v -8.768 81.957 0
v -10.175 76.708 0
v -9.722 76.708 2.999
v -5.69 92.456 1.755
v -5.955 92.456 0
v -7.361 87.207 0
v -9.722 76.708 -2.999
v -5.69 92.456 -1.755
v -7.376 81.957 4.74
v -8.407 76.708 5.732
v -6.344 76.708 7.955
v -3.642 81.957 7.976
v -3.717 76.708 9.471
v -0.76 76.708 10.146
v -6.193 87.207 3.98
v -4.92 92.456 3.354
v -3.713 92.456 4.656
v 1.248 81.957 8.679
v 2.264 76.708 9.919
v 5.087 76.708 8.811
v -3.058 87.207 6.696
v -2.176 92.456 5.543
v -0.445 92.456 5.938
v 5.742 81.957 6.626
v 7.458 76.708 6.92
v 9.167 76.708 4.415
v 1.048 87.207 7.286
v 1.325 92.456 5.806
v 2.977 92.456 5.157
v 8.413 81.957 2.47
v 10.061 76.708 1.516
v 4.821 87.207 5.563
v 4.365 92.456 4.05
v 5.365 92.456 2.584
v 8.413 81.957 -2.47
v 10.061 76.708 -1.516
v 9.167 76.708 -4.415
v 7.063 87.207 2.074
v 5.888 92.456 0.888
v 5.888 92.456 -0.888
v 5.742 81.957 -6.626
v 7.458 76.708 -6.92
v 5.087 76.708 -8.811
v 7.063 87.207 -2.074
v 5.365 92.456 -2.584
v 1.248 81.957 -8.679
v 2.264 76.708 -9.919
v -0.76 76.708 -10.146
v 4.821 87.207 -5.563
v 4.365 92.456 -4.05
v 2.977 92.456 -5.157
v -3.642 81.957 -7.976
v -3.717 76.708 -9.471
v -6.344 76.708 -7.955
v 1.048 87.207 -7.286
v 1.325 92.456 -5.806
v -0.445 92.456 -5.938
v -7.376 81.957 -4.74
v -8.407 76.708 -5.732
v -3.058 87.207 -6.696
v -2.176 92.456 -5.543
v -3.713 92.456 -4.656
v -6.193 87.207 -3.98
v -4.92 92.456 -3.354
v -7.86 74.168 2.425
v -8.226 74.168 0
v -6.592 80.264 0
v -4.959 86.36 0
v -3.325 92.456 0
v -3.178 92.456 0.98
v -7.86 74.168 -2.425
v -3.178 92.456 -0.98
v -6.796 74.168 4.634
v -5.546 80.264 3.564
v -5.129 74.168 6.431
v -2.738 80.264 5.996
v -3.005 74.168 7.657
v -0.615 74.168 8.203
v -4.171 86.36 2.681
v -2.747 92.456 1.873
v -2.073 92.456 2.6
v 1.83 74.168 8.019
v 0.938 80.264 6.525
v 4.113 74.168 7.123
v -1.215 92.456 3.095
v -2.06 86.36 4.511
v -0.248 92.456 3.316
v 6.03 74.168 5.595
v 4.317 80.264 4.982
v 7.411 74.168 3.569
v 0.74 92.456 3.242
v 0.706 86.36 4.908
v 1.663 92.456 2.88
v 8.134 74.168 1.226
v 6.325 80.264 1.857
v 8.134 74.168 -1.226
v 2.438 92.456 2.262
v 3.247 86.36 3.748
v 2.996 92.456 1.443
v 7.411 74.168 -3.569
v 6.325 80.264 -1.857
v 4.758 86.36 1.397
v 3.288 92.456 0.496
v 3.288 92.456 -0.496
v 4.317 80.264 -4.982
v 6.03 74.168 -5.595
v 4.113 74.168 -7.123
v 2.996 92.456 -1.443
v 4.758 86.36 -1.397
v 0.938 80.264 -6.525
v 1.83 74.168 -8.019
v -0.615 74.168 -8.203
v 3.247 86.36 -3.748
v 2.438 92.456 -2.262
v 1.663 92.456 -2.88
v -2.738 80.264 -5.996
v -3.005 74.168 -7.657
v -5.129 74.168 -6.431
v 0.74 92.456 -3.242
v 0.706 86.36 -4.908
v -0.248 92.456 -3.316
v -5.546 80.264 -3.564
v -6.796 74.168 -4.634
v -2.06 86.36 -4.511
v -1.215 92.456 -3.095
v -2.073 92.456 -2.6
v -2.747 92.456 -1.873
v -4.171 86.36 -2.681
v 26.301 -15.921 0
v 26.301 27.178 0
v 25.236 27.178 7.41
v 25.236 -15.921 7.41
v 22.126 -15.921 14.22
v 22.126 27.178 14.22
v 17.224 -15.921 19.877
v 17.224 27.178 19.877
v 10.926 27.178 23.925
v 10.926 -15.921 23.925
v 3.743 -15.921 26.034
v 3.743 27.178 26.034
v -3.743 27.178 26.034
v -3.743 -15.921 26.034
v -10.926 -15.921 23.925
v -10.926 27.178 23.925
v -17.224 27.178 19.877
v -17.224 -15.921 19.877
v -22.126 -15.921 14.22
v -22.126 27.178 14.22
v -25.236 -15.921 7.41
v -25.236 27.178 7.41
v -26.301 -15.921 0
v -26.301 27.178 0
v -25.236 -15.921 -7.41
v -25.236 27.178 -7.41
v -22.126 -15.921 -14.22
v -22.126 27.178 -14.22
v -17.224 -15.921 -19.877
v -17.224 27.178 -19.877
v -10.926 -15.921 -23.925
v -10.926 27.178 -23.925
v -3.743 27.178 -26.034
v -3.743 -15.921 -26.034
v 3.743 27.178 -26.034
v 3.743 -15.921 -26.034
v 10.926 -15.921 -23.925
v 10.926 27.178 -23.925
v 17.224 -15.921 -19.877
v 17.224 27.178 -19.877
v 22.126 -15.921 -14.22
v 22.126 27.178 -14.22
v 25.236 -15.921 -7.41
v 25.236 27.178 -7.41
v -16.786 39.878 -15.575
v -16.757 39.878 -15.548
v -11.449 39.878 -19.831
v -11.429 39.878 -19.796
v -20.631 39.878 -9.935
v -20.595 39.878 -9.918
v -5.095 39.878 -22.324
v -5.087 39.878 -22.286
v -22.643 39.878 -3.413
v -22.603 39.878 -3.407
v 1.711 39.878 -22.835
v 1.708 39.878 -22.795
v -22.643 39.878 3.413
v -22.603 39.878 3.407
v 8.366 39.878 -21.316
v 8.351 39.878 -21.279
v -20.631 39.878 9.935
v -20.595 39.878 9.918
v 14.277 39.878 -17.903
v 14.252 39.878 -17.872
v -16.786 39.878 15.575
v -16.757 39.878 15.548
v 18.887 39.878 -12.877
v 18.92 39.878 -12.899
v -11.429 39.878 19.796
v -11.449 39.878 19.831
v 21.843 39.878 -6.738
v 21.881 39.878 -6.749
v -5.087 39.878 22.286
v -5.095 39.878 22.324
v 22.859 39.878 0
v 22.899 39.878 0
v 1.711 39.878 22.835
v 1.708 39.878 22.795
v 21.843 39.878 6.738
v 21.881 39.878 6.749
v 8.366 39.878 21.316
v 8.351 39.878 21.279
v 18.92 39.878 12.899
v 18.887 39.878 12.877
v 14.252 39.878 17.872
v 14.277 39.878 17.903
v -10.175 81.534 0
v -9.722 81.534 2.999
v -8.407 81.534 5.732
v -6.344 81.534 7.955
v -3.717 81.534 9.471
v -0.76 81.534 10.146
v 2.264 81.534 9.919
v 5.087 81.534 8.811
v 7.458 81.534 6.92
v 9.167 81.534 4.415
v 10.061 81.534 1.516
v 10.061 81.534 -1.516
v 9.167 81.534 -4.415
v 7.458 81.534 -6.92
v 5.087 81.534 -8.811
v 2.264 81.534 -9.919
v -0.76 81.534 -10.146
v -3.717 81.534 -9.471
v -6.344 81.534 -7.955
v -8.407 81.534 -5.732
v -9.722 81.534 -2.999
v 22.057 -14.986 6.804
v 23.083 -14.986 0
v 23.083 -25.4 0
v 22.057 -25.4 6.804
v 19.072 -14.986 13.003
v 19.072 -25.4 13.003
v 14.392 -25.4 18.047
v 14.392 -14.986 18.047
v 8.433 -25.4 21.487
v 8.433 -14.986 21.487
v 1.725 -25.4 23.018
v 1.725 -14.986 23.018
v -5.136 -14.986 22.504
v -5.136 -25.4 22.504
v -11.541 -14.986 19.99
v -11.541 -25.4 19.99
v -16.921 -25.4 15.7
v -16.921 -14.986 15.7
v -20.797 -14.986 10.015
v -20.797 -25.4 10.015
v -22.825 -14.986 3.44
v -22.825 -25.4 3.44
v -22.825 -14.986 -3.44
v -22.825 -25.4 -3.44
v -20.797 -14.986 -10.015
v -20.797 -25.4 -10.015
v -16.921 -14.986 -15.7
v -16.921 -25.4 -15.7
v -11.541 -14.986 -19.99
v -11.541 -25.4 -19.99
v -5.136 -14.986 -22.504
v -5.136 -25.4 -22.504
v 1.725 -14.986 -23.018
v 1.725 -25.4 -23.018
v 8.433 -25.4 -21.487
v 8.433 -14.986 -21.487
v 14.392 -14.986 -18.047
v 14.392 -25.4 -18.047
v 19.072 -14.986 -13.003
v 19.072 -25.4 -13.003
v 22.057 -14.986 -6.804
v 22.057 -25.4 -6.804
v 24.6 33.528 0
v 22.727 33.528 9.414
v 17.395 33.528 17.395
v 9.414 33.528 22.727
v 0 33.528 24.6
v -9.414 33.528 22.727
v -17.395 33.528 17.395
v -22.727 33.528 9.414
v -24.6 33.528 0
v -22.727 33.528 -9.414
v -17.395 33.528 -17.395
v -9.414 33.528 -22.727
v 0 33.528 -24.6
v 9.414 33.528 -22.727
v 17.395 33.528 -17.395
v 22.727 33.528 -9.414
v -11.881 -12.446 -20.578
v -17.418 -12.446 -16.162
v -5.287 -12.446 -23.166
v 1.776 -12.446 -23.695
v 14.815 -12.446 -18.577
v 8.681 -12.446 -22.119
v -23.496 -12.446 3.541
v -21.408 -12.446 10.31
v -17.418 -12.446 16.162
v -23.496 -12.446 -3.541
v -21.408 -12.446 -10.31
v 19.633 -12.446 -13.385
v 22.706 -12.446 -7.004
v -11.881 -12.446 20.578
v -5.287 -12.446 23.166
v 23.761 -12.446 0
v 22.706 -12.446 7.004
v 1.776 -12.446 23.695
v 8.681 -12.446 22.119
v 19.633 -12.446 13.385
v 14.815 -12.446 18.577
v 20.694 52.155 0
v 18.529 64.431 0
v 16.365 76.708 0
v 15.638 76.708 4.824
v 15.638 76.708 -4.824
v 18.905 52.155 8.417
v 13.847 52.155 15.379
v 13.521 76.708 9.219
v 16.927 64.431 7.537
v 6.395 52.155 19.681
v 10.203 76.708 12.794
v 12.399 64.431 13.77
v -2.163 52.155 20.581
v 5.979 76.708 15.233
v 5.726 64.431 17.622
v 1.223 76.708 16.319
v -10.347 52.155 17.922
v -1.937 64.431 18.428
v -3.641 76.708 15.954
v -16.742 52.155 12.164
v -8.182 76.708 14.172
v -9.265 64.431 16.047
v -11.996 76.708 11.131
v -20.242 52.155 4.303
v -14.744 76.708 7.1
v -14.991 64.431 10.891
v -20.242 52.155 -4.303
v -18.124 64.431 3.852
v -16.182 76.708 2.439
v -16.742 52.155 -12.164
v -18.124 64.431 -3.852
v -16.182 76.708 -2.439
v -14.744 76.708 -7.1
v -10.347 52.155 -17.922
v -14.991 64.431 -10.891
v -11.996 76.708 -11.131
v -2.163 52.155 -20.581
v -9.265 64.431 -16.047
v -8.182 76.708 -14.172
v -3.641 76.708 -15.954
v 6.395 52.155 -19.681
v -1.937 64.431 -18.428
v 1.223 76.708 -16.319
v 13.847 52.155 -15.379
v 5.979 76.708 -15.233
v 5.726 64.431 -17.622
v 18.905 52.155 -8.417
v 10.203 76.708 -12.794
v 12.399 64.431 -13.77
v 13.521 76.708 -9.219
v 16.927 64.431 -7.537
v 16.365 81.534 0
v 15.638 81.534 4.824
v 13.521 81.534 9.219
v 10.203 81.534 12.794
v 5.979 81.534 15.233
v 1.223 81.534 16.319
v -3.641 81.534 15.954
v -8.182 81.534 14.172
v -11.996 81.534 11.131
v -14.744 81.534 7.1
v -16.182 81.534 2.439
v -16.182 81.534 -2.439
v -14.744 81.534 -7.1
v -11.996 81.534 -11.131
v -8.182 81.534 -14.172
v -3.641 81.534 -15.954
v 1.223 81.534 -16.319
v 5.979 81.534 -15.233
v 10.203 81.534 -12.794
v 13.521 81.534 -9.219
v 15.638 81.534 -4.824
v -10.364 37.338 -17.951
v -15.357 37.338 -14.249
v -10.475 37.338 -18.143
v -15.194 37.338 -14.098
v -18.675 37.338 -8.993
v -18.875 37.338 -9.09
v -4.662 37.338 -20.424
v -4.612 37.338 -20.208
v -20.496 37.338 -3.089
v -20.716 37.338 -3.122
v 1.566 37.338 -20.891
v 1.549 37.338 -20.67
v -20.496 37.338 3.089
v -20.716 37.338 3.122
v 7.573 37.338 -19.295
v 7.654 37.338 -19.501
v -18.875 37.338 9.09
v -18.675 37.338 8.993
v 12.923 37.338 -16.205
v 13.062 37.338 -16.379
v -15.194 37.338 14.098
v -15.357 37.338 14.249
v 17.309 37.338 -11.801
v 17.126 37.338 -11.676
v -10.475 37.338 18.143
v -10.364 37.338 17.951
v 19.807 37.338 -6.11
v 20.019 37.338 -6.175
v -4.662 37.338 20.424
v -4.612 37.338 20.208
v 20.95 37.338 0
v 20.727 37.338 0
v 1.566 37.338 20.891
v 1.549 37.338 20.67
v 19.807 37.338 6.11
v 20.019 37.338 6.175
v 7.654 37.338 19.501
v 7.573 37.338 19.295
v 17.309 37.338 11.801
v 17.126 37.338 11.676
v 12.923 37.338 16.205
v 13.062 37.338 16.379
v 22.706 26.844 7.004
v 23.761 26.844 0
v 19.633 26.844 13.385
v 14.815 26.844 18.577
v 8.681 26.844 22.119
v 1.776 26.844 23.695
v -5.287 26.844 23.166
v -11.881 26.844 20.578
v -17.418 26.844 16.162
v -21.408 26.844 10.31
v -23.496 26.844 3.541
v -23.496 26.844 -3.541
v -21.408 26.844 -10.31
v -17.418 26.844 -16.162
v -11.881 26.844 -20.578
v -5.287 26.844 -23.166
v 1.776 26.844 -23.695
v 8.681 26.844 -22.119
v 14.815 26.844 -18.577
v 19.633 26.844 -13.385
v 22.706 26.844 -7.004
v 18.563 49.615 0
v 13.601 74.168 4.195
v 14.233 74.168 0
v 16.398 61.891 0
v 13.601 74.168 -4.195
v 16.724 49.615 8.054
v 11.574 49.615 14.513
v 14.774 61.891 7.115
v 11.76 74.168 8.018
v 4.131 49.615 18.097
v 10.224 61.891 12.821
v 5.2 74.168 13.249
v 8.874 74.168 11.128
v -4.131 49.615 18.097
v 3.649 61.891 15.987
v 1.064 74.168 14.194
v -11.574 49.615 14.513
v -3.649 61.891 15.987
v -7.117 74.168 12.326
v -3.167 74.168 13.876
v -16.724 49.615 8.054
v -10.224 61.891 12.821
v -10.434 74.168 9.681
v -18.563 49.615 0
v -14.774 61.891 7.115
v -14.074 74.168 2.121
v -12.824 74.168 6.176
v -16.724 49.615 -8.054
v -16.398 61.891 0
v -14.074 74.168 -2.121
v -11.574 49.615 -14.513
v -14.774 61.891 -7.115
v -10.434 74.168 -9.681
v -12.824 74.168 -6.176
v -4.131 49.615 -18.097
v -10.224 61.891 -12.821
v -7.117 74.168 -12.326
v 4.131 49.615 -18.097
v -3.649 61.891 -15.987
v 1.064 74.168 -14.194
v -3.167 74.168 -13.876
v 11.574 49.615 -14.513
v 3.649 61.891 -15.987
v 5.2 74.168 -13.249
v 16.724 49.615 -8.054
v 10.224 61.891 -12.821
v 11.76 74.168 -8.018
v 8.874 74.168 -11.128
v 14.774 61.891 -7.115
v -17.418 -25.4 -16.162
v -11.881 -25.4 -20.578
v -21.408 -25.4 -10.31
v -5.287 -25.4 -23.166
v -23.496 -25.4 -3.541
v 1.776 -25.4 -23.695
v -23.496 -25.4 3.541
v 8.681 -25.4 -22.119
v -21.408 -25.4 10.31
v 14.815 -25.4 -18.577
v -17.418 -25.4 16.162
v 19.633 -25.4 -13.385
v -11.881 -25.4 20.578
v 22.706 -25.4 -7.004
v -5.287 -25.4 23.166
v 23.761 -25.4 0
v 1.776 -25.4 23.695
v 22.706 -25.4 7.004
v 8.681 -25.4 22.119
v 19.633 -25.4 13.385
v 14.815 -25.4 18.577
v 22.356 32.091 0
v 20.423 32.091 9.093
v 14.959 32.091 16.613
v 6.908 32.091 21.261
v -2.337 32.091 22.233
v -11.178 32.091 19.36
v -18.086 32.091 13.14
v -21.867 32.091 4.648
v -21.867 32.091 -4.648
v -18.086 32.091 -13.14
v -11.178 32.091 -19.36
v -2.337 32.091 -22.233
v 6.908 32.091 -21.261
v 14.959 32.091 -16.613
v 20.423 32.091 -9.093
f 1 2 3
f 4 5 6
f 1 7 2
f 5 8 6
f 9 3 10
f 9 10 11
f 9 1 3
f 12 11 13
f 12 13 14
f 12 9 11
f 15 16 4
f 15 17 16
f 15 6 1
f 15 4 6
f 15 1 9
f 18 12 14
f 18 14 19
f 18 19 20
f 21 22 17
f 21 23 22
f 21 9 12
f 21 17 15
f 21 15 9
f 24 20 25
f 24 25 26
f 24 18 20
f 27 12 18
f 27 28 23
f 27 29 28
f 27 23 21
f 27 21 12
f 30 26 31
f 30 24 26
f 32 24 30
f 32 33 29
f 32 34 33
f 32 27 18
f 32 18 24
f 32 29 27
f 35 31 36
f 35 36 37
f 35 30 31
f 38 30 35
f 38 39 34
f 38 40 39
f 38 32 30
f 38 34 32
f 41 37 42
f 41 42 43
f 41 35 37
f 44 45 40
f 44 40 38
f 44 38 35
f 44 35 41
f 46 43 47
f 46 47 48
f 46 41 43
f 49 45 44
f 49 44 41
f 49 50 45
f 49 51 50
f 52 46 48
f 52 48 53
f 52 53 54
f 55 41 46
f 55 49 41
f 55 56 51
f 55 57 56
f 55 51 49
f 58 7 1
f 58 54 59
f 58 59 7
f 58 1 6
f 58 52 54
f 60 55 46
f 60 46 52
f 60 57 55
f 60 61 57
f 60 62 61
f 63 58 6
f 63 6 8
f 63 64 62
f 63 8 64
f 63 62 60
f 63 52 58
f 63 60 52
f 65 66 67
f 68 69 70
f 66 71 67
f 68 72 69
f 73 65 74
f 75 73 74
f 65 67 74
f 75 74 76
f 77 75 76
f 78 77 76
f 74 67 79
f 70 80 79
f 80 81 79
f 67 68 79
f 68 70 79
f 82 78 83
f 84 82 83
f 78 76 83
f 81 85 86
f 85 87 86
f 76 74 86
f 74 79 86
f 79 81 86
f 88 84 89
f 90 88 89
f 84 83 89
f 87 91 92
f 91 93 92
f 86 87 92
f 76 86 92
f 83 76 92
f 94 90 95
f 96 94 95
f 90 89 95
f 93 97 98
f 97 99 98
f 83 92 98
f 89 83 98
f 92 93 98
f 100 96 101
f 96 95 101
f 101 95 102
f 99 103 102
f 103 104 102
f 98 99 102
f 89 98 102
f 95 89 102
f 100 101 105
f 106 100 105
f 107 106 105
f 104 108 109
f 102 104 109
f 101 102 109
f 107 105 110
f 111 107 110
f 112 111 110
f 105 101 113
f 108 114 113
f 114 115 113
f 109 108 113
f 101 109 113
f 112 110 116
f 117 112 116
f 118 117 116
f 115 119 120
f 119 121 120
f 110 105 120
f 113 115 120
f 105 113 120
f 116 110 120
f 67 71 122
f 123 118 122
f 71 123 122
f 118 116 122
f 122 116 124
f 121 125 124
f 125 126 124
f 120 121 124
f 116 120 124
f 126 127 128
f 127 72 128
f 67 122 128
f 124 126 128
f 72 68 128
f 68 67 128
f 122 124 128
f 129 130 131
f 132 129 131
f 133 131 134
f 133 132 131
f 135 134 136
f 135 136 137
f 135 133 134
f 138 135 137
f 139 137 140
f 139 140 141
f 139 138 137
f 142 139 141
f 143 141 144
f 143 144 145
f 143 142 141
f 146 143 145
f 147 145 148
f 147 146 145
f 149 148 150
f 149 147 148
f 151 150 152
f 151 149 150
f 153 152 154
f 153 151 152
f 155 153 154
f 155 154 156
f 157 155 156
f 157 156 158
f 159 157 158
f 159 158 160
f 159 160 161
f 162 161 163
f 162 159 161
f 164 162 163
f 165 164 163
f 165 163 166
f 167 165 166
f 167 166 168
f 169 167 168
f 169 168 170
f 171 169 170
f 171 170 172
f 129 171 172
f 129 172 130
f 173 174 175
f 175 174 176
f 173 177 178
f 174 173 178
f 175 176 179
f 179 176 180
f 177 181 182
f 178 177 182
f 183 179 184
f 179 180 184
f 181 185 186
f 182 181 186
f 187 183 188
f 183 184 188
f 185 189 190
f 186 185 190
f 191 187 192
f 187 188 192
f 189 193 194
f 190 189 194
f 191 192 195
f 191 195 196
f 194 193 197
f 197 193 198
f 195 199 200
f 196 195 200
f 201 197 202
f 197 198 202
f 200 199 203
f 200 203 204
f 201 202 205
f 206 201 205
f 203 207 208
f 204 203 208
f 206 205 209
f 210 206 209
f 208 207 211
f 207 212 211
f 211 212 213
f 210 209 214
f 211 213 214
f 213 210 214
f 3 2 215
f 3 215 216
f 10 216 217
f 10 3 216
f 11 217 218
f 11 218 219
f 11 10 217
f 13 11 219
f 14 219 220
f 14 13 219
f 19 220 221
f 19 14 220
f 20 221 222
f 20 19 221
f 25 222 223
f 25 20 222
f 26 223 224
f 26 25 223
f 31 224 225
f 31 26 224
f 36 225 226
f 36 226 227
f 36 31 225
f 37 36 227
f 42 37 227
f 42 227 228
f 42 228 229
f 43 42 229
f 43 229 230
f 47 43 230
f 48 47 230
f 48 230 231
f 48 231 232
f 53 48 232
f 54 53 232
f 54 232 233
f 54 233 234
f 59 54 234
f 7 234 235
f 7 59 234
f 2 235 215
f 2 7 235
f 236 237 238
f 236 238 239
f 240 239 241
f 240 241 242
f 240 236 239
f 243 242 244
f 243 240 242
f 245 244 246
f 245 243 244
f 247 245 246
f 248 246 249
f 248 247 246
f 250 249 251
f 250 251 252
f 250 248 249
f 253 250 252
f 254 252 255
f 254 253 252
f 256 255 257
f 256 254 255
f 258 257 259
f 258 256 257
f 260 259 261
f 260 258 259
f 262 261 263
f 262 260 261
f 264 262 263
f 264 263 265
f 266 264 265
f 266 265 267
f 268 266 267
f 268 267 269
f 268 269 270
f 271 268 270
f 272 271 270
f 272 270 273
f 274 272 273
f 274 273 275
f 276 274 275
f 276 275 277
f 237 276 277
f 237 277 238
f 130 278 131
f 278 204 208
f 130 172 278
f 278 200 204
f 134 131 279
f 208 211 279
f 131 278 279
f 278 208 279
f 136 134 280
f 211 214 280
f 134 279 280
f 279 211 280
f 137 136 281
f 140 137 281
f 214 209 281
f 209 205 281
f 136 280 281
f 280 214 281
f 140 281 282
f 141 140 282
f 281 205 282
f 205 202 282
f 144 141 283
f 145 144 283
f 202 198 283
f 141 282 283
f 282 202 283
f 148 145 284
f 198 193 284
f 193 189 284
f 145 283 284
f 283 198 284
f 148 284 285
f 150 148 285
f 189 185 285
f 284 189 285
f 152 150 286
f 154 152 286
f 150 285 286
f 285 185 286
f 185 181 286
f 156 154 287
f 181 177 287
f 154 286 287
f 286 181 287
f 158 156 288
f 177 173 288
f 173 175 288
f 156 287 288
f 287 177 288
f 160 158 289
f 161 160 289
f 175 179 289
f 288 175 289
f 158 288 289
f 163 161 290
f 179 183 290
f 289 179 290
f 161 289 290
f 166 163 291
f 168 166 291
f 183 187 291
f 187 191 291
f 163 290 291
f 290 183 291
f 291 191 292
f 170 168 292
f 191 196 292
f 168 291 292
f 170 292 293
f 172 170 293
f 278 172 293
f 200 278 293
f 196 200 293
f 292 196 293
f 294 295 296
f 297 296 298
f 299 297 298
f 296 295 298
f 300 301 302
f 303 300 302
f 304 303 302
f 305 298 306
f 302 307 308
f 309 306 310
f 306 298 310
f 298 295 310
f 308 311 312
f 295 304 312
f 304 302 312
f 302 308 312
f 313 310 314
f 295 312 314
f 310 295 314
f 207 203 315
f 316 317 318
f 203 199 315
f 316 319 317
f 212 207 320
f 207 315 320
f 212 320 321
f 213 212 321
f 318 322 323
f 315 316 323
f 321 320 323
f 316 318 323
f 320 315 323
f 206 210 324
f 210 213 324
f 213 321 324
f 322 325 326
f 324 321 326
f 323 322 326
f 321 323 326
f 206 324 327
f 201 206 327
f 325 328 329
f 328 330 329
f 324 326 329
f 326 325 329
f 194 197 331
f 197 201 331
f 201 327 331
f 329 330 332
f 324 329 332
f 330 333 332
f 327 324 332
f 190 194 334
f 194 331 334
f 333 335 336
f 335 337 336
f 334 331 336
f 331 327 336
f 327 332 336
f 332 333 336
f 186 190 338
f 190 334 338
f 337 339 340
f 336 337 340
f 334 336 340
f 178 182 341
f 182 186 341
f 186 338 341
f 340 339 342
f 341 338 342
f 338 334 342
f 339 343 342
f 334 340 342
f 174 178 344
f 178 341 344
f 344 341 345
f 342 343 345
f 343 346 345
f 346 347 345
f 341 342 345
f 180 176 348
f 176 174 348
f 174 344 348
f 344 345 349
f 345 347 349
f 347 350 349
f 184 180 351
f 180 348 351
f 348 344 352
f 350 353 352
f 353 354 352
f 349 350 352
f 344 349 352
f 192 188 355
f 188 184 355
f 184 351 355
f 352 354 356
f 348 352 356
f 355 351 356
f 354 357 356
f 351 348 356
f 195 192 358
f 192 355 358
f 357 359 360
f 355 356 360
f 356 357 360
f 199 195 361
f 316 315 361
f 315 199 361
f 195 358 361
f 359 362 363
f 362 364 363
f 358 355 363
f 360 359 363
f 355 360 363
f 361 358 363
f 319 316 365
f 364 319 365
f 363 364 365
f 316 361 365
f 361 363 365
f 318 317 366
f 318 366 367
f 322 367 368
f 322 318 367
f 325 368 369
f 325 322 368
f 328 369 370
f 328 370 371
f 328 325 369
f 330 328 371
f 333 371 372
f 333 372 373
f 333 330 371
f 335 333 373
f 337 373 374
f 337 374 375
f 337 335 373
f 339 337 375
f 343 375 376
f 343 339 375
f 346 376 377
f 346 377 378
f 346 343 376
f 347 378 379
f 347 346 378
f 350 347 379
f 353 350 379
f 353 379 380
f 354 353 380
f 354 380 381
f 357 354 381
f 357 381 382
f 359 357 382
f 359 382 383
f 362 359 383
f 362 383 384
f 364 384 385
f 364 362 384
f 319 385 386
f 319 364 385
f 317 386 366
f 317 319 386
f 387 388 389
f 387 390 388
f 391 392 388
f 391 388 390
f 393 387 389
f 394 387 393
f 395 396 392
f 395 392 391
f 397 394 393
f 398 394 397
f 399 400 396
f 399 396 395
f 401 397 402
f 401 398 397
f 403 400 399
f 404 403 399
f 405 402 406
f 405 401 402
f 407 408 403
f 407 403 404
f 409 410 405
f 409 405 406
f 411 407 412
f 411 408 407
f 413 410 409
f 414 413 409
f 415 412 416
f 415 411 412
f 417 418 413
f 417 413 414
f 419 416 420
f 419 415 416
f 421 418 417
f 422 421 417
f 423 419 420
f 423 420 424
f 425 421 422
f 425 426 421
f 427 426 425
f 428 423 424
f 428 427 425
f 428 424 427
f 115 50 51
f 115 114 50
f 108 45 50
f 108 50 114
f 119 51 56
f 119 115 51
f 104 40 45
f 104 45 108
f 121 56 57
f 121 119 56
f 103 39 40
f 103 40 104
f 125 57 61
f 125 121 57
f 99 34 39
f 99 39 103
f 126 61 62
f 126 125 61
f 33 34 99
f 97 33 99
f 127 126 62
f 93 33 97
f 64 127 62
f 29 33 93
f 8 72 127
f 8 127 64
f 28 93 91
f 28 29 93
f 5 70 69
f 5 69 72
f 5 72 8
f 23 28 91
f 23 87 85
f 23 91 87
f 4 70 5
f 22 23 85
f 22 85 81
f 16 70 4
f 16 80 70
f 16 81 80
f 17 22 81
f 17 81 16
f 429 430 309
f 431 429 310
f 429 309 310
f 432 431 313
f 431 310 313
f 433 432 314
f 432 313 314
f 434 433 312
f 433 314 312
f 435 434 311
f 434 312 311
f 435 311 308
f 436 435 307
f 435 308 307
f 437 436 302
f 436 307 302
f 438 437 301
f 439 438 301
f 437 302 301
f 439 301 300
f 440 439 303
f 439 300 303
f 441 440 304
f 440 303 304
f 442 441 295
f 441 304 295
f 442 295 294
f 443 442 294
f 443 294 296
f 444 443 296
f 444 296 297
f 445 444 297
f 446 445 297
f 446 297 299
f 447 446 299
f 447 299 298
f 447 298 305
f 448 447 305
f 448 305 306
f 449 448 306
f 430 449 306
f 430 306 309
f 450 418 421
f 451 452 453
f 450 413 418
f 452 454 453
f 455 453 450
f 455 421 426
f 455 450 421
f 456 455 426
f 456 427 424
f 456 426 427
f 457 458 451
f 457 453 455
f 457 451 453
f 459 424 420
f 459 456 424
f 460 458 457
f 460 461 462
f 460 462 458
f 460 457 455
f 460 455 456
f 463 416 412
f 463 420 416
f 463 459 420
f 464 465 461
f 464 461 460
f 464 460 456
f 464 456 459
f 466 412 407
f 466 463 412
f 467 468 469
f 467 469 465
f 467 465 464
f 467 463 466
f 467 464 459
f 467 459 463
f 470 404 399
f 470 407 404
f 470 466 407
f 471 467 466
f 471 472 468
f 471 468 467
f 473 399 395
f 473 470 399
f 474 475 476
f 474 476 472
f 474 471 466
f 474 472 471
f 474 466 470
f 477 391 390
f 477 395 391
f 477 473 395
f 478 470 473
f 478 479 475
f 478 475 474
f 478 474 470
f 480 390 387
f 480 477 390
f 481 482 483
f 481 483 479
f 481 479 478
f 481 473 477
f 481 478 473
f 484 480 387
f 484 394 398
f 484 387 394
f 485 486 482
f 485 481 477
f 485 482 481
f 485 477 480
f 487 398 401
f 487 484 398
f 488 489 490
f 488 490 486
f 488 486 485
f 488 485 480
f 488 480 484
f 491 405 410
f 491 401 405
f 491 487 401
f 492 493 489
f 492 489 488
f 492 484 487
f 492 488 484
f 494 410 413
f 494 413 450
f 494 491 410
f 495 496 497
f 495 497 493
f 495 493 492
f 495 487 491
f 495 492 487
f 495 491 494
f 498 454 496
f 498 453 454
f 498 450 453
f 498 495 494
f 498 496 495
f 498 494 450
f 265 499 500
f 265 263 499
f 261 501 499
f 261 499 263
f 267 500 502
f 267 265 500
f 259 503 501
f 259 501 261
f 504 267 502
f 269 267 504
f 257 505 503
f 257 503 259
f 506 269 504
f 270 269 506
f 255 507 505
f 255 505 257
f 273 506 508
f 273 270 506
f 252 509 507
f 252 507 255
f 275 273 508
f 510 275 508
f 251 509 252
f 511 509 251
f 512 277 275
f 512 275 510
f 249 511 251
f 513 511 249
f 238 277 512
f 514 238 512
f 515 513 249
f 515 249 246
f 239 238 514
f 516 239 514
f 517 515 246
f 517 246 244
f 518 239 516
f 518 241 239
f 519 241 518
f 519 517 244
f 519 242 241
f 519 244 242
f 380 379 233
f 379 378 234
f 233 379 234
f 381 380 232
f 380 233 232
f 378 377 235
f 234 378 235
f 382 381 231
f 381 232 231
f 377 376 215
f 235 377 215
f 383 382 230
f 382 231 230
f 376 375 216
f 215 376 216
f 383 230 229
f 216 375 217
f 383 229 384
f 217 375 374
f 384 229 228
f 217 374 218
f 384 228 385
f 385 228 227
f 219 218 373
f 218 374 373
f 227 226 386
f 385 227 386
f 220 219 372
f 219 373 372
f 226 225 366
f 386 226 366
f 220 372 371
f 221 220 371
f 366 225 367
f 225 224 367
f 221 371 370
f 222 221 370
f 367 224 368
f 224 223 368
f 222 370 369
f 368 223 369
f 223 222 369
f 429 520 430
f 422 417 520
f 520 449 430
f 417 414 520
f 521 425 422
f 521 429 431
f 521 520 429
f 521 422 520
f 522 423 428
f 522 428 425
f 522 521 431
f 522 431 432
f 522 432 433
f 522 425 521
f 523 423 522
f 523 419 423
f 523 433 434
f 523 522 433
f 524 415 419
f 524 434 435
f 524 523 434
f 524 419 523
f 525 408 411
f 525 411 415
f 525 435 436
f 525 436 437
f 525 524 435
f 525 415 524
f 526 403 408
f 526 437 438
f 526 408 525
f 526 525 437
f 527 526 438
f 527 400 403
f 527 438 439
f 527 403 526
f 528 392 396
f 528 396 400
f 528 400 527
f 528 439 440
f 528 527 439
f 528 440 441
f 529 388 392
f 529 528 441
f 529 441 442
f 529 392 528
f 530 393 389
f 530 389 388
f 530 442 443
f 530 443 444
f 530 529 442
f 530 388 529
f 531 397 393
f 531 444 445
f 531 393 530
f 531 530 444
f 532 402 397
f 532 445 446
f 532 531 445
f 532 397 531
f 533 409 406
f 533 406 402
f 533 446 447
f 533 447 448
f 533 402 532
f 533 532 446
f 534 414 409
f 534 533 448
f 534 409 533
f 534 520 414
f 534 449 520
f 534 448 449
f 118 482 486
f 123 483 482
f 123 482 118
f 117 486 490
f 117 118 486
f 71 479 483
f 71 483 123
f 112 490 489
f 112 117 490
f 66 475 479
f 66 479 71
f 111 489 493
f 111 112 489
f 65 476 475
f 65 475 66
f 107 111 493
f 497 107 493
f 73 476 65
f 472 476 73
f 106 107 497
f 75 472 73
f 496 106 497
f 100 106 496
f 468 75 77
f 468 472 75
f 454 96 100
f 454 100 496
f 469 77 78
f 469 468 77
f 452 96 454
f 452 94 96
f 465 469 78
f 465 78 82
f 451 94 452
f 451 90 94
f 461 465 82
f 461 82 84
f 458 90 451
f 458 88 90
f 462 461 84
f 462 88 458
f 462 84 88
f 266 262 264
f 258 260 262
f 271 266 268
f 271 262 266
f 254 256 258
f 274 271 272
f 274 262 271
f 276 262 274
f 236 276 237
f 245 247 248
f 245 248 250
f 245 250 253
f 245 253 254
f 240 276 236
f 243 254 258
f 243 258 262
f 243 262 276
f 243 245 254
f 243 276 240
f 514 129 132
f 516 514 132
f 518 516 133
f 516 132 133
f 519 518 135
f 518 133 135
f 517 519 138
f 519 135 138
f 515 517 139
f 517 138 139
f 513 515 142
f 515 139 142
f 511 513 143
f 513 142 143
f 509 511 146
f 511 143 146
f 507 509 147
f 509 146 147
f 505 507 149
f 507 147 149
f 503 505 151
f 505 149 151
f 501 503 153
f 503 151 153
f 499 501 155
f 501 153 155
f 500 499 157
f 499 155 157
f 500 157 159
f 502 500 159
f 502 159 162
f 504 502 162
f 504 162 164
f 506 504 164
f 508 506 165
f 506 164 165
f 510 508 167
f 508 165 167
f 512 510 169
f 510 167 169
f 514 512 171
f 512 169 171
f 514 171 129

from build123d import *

# Parameters (mm, degrees)
F0_R          = 26.3014880092
F0_R_2        = 23.0827140561
F1_DEPTH      = 39.878
F1_DEPTH_BACK = 25.4
F2_DEPTH      = 14.986
F3_DEPTH      = 76.708
F5_SIZE2      = 3.4029547439
F5_SIZE       = 12.7
F6_SIZE2      = 9.4794090512
F6_SIZE       = 2.54
F7_R          = 13.5748533888
F8_DEPTH      = 15.748
F10_T         = -2.54
F11_DEPTH     = 4.826


# Not quite as in the source:
# - a fillet or chamfer that OpenCascade refuses, or shapes differently, is made with other operations: its cross-section is extruded or revolved along the edge and cut away or added


with BuildPart() as f1:
    # F0 (on Front) → F1 (new body, two sides)
    with BuildSketch(Plane.XZ) as f1_sk:
        Circle(F0_R)
        Circle(F0_R_2, mode=Mode.SUBTRACT)
    extrude(amount=-F1_DEPTH)
    extrude(f1_sk.sketch, amount=F1_DEPTH_BACK)

    # F0 (on Front) → F2 (join)
    with BuildSketch(Plane.XZ):
        Circle(F0_R_2)
    extrude(amount=F2_DEPTH)

    # F0 (on Front) → F3 (join)
    with BuildSketch(Plane.XZ):
        Circle(F0_R_2)
    extrude(amount=-F3_DEPTH)

    # F4: chamfer of 38.1 x 6.718057965 on 1 edges, made by hand


with BuildPart() as f4_tool2:
    # F4_s3 → F4_t4 (revolve)
    with BuildSketch(Plane.XY):
        Polygon((23.0827140561, 38.608), (16.3646560911, 76.708), (23.0827140561, 76.708), align=None)
    revolve(axis=Axis((0, 76.708, 0), (0, -1, 0)))

    split(bisect_by=Plane.XZ.offset(-39.878), keep=Keep.BOTTOM)


with BuildPart() as f1_1:
    add(f1.part)

    # F4_t1: cut F4_tool2
    add(f4_tool2.part, mode=Mode.SUBTRACT)

    # F5
    f5_edges = [f1_1.edges().sort_by_distance(p)[0] for p in [
        (-26.301488, 39.878, 0),
    ]]
    f5_side = f1_1.faces().sort_by_distance((-26.301488, 7.239, 0))[0]
    chamfer(f5_edges, length=F5_SIZE, length2=F5_SIZE2, reference=f5_side)

    # F6
    f6_edges = [f1_1.edges().sort_by_distance(p)[0] for p in [
        (-26.301488, -25.4, 0),
    ]]
    f6_side = f1_1.faces().sort_by_distance((-25.55757, -25.4, 0))[0]
    chamfer(f6_edges, length=F6_SIZE, length2=F6_SIZE2, reference=f6_side)

    # F7 (on face) → F8 (join)
    with BuildSketch(Plane(origin=(0, 76.708, 0), x_dir=(-1, 0, 0), z_dir=(0, 1, 0))):
        Circle(F7_R)
    extrude(amount=F8_DEPTH)

    # F9: chamfer of 7.62 x 28.4382271537 on 1 edges, made by hand


with BuildPart() as f9_tool2:
    # F9_s3 → F9_t4 (revolve)
    with BuildSketch(Plane.XY):
        Polygon((-13.5748533888, 64.0177728463), (-5.9548533888, 92.456), (-13.5748533888, 92.456), align=None)
    revolve(axis=Axis((0, 92.456, 0), (0, 1, 0)))

    split(bisect_by=Plane.XZ.offset(-76.708), keep=Keep.BOTTOM)


with BuildPart() as f1_2:
    add(f1_1.part)

    # F9_t1: cut F9_tool2
    add(f9_tool2.part, mode=Mode.SUBTRACT)

    # F10
    f10_openings = [f1_2.faces().sort_by_distance(p)[0] for p in [
        (0, 92.456, 0),
    ]]
    offset(amount=F10_T, openings=f10_openings, kind=Kind.INTERSECTION)

    # F11 (add): a face of the model
    f11_faces = [f1_2.faces().sort_by_distance(p)[0] for p in [
        (-15.9017937193, 76.708, 0),
    ]]
    extrude(f11_faces, amount=F11_DEPTH)


solid = f1_2.part
